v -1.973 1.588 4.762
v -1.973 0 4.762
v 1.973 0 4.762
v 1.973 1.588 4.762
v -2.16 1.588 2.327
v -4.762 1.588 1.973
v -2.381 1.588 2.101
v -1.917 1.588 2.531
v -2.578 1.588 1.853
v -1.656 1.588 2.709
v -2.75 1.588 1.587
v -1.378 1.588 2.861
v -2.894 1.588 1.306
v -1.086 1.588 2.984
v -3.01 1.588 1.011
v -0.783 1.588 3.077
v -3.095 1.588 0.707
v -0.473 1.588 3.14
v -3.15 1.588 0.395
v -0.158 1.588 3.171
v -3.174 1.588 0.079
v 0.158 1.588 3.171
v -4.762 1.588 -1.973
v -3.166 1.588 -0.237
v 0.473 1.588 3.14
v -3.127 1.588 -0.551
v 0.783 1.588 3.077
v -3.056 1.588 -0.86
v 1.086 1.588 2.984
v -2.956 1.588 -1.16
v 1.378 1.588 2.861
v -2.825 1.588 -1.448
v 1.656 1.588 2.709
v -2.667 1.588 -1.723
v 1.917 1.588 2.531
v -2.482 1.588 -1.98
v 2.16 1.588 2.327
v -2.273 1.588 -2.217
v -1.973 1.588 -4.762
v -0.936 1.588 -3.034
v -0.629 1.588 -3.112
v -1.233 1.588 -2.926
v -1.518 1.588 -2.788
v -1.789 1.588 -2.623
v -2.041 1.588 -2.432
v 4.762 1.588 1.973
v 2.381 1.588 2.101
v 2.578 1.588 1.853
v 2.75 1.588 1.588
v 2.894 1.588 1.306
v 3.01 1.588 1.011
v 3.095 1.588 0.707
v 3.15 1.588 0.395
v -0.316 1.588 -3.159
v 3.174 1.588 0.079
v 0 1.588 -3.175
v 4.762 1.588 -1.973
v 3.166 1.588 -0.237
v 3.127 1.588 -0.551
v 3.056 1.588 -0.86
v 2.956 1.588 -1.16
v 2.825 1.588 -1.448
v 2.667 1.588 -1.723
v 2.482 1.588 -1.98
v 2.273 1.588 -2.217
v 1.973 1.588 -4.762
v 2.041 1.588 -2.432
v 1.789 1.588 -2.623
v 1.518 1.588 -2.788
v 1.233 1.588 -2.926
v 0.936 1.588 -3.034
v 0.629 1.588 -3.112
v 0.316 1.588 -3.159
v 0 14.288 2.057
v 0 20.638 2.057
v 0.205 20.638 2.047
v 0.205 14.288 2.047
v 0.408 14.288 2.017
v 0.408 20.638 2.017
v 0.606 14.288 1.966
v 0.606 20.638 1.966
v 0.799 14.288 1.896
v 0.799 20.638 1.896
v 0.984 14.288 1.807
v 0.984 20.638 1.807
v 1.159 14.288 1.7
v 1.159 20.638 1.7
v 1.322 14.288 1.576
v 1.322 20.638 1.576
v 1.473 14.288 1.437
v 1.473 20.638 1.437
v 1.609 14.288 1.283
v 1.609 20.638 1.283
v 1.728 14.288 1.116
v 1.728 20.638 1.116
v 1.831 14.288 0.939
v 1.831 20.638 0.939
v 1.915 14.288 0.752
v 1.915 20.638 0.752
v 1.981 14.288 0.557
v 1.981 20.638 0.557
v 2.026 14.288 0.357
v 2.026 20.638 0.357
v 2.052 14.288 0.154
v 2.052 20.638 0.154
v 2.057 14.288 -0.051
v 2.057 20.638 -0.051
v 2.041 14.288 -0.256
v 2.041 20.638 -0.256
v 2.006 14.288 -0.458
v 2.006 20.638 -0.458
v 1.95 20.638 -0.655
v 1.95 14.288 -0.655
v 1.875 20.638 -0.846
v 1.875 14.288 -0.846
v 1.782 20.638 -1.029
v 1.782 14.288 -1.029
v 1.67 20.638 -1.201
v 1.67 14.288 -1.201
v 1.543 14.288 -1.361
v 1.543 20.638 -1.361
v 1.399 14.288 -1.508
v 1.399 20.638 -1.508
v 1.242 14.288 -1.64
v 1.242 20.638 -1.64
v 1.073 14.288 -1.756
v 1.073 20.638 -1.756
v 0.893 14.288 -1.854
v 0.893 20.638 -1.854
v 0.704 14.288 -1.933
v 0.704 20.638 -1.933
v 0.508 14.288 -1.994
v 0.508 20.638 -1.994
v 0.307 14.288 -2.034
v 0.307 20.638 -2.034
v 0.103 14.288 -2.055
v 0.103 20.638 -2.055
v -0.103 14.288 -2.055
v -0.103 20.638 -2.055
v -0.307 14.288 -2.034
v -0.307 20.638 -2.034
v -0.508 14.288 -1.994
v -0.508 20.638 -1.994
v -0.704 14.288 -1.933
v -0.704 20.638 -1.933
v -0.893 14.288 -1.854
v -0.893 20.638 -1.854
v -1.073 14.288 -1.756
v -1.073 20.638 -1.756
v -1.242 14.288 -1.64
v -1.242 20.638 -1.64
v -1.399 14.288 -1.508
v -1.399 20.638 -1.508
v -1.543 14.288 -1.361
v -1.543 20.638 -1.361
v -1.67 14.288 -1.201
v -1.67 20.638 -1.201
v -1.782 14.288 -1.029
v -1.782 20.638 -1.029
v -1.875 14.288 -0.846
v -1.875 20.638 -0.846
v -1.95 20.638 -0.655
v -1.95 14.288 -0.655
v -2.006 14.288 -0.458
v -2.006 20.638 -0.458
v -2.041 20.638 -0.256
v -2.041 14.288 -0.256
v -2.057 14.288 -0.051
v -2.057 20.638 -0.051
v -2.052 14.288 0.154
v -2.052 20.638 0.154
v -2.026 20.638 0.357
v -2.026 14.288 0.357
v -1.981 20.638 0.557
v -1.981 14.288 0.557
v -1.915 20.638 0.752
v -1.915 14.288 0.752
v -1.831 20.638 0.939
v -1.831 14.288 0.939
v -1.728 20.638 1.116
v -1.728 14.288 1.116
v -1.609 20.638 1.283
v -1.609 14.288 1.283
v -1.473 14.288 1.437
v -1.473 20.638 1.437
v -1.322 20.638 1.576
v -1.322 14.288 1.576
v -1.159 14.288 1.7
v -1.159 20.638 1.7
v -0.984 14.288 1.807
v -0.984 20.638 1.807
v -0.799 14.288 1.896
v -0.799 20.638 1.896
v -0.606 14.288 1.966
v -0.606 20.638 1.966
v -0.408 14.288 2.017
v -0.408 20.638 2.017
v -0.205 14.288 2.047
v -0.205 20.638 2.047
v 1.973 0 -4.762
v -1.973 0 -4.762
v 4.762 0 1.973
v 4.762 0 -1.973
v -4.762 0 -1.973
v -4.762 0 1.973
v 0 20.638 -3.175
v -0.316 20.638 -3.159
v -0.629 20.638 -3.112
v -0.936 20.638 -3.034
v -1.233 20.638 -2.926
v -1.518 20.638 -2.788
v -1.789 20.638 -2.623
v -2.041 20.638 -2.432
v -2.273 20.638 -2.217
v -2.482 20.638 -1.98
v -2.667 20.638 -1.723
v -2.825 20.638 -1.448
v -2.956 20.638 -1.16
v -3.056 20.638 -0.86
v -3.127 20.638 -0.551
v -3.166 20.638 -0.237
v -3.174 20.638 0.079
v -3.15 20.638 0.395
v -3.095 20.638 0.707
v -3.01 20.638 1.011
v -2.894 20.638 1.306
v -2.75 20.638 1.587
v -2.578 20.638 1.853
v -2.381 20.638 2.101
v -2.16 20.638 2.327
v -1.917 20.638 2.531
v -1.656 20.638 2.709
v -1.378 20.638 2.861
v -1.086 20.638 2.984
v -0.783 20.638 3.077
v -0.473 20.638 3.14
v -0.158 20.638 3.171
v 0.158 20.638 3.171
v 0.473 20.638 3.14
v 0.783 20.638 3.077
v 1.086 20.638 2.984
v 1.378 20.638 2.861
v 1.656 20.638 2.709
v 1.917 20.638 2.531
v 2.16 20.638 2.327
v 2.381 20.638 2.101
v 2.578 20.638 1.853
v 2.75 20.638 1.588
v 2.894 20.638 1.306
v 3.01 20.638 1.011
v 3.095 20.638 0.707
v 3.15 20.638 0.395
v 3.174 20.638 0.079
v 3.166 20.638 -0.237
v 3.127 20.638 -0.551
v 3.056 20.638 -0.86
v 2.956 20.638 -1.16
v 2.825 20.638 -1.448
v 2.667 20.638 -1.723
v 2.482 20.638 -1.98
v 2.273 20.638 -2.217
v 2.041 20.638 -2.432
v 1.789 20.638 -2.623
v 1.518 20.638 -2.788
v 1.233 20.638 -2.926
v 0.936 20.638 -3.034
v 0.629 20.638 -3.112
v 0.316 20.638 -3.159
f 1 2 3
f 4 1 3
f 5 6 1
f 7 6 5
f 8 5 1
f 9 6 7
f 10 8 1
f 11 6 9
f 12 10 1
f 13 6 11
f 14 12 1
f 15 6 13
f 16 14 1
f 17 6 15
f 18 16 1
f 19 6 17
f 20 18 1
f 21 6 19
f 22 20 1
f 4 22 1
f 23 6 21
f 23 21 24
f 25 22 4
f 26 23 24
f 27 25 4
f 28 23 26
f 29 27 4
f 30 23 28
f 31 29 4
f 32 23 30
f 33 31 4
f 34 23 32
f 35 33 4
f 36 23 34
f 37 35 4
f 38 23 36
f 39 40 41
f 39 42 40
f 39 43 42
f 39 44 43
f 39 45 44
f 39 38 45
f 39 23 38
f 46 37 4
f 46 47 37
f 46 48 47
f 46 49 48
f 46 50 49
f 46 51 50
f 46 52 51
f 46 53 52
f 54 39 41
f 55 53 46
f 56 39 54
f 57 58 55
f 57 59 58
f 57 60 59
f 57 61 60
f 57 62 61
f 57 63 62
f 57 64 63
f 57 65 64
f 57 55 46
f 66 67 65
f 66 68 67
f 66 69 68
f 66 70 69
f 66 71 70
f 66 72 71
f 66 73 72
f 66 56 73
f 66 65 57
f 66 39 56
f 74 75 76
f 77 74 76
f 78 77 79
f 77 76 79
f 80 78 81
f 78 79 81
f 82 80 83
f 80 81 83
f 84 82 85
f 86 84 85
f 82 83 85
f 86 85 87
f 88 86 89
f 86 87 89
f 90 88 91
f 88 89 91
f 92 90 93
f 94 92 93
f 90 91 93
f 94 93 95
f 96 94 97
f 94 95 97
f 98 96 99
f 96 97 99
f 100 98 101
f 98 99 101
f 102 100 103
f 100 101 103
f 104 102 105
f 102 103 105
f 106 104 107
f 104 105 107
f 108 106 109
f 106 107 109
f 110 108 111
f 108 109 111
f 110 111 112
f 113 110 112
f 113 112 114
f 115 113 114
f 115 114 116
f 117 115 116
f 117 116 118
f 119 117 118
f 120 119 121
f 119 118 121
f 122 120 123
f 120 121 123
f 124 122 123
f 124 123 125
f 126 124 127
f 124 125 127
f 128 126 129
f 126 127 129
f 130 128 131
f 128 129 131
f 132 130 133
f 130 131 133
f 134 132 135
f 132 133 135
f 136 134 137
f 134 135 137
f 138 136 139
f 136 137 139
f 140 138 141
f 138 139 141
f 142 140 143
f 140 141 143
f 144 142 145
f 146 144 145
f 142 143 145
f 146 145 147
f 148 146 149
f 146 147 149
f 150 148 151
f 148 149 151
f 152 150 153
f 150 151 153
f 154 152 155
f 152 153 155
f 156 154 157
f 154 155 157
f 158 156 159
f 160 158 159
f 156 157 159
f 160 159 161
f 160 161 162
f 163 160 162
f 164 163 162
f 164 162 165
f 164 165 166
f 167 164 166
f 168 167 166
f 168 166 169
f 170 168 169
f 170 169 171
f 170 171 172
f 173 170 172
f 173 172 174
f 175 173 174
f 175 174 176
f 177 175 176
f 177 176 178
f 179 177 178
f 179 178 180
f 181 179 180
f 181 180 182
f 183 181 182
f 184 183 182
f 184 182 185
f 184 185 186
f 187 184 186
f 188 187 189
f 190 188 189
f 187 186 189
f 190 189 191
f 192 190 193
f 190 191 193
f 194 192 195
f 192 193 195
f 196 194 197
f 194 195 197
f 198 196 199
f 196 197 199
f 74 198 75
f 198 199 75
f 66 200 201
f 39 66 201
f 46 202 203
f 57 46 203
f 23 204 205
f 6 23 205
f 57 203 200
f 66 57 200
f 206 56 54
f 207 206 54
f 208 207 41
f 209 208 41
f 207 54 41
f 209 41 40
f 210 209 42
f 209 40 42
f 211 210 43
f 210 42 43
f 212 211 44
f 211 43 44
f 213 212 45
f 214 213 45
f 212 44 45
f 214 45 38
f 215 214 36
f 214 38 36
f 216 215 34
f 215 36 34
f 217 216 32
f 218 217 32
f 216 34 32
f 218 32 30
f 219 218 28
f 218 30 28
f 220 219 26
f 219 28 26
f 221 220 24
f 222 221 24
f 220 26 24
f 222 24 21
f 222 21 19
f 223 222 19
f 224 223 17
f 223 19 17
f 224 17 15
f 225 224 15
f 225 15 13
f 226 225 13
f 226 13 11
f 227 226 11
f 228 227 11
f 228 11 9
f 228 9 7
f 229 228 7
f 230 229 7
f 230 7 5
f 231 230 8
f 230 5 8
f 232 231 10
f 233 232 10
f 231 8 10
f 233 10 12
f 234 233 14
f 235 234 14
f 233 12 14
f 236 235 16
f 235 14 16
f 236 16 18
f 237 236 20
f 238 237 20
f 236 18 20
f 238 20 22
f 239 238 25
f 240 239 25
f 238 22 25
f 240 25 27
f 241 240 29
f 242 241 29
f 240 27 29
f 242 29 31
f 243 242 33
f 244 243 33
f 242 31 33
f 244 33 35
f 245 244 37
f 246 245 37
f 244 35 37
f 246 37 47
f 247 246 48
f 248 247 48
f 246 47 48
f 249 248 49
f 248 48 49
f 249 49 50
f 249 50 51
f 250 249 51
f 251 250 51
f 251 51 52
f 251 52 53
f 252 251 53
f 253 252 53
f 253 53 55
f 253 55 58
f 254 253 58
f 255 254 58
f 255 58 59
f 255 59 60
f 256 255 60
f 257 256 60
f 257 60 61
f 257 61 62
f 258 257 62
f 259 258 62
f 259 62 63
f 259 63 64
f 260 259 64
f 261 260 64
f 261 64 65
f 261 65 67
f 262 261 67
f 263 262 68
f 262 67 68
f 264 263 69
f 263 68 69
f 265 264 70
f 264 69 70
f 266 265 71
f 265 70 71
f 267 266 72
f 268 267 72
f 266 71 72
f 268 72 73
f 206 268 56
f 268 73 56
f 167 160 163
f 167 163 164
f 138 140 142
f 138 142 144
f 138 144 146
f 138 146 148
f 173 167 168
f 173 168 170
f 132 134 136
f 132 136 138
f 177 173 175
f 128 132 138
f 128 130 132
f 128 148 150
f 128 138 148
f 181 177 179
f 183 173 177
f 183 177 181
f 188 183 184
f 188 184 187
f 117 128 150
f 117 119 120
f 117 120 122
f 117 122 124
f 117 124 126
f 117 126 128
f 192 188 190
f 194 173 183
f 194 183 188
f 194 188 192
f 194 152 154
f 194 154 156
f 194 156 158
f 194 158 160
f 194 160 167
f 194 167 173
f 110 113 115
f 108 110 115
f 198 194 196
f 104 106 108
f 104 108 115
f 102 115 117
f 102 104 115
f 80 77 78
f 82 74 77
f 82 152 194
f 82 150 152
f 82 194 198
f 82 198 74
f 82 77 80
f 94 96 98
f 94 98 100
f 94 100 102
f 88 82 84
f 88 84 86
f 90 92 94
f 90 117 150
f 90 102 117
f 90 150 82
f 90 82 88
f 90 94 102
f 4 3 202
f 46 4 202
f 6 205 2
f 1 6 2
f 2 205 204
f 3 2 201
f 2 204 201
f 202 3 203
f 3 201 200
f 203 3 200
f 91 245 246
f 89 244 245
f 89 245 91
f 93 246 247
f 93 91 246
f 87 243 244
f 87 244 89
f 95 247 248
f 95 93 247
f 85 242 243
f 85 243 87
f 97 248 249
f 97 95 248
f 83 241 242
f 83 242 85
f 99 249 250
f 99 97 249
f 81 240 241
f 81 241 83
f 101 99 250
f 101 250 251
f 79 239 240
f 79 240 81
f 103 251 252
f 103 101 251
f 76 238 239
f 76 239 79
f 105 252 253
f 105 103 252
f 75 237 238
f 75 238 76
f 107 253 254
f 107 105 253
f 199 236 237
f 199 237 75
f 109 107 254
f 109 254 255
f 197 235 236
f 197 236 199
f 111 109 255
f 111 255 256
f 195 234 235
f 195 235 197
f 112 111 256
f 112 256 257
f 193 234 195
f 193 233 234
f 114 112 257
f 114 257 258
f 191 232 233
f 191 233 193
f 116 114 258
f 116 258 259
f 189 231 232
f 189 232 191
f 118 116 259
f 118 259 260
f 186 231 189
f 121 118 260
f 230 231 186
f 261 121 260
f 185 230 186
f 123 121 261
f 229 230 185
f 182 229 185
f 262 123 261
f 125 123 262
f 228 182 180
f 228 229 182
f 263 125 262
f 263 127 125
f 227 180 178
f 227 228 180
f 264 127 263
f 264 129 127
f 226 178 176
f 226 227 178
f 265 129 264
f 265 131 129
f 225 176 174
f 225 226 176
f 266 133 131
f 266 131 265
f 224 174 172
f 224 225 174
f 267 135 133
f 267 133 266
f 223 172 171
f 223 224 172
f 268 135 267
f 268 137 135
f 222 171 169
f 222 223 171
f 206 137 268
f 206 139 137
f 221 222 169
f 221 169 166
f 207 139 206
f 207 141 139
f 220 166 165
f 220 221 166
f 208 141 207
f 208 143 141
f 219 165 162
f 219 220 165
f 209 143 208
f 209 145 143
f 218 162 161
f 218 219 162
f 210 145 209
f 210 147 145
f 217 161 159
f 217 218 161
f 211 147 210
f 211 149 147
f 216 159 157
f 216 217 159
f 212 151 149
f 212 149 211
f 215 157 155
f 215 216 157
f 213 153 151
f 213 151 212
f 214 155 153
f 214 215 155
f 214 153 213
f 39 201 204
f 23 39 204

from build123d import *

# Parameters (mm, degrees)
BOSS_EXTRUDE1_DEPTH = 1.5875
SKETCH2_R           = 3.175
BOSS_EXTRUDE2_DEPTH = 19.05
SKETCH3_R           = 2.0574
CUT_EXTRUDE1_DEPTH  = 6.35


with BuildPart() as part:
    # Sketch1 → Boss-Extrude1 (new body)
    with BuildSketch(Plane(origin=(0, 0, 0), x_dir=(1, 0, 0), z_dir=(0, 1, 0))):
        Polygon((4.7625, -1.972692091), (4.7625, 1.972692091), (1.972692091, 4.7625), (-1.972692091, 4.7625), (-4.7625, 1.972692091), (-4.7625, -1.972692091), (-1.972692091, -4.7625), (1.972692091, -4.7625), align=None)
    extrude(amount=BOSS_EXTRUDE1_DEPTH)

    # Sketch2 → Boss-Extrude2 (add)
    with BuildSketch(Plane(origin=(0, 1.5875, 0), x_dir=(1, 0, 0), z_dir=(0, 1, 0))):
        with Locations(Location((0, 0, 0), (0, 0, 90))):
            Circle(SKETCH2_R)
    extrude(amount=BOSS_EXTRUDE2_DEPTH)

    # Sketch3 → Cut-Extrude1 (cut)
    with BuildSketch(Plane(origin=(0, 20.6375, 0), x_dir=(1, 0, 0), z_dir=(0, 1, 0))):
        with Locations(Location((0, 0, 0), (0, 0, 270))):
            Circle(SKETCH3_R)
    extrude(amount=-CUT_EXTRUDE1_DEPTH, mode=Mode.SUBTRACT)


solid = part.part
